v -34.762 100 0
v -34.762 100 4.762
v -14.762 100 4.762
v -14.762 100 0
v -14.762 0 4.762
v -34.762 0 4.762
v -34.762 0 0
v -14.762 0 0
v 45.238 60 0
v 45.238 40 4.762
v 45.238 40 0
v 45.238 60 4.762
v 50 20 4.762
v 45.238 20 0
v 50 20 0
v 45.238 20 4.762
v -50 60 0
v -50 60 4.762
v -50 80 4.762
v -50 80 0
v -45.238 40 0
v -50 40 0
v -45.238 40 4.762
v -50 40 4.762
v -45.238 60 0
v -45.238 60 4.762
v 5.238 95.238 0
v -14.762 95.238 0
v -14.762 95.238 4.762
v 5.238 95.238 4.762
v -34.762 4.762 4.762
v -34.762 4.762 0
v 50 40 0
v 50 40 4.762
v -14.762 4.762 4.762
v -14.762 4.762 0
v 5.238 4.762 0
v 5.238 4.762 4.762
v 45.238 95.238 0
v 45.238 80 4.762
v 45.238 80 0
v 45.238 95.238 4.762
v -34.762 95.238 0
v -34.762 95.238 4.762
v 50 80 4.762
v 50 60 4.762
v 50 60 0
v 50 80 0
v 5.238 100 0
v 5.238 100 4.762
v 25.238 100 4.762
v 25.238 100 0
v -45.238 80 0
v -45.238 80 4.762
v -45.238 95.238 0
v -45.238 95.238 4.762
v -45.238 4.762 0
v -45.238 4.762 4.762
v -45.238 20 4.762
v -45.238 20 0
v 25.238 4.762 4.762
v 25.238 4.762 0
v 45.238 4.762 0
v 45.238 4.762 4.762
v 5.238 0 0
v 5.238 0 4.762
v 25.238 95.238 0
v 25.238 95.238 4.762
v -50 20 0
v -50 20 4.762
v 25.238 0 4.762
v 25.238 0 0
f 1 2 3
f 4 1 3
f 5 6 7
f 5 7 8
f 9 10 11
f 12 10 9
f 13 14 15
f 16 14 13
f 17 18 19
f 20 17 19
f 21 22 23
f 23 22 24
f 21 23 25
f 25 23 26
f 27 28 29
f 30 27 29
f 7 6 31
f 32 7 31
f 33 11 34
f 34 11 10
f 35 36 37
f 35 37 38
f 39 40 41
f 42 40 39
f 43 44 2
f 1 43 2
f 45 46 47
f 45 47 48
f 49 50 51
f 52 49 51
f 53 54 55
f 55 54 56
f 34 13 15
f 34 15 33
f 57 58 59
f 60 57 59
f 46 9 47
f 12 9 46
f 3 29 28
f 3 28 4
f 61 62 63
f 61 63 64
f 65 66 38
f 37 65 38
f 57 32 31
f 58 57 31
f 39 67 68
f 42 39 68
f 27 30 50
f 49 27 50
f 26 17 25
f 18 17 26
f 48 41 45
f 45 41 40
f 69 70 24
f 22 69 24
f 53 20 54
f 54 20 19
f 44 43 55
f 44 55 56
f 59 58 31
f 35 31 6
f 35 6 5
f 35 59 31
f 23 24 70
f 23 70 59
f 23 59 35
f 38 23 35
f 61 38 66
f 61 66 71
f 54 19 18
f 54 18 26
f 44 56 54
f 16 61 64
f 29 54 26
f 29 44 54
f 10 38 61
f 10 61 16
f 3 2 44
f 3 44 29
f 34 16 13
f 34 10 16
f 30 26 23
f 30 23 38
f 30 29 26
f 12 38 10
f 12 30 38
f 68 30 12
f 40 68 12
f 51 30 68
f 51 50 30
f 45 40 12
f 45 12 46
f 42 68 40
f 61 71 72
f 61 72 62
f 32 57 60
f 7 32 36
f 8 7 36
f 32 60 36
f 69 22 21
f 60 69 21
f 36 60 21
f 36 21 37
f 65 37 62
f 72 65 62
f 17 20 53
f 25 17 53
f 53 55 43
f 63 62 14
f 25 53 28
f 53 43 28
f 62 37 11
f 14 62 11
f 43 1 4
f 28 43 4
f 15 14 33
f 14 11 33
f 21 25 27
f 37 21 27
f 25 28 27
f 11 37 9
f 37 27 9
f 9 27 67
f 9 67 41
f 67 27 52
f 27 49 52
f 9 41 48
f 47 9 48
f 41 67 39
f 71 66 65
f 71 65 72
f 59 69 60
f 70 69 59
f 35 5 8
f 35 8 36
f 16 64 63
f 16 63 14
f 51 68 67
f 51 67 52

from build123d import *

# Parameters (mm, degrees)
SKETCH2_W           = 100
SKETCH2_H           = 100
BOSS_EXTRUDE1_DEPTH = 4.7625
CAVITY1_START       = -50
CAVITY1_OUTLINE_W   = 20
CAVITY1_OUTLINE_H   = 4.7625
CAVITY1_DEPTH       = 4.7625
CAVITY1_START_2     = 45.2375
CAVITY1_2_OUTLINE_W = 20
CAVITY1_2_OUTLINE_H = 4.7625
CAVITY1_2_DEPTH     = 4.7625
CAVITY1_START_3     = -14.7625
CAVITY1_3_OUTLINE_W = 4.7625
CAVITY1_3_OUTLINE_H = 4.7625
CAVITY1_3_DEPTH     = 20
CAVITY1_START_4     = 25.2375
CAVITY1_4_OUTLINE_W = 4.7625
CAVITY1_4_OUTLINE_H = 4.7625
CAVITY1_4_DEPTH     = 20
CAVITY1_START_5     = -45.2375
CAVITY1_5_OUTLINE_W = 4.7625
CAVITY1_5_OUTLINE_H = 4.7625
CAVITY1_5_DEPTH     = 10.475


# Read off the part's stored shape, not the designer's step: Cavity1
with BuildPart() as part:
    # Sketch2 → Boss-Extrude1 (new body)
    with BuildSketch(Plane.XY.offset(4.7625)):
        with Locations((0, 50)):
            Rectangle(SKETCH2_W, SKETCH2_H)
    extrude(amount=-BOSS_EXTRUDE1_DEPTH)

    # Cavity1 outline → Cavity1 (cut)
    with BuildSketch(Plane.YZ.offset(CAVITY1_START)):
        with Locations((10, 2.38125)):
            Rectangle(CAVITY1_OUTLINE_W, CAVITY1_OUTLINE_H)
        with Locations((50, 2.38125)):
            Rectangle(CAVITY1_OUTLINE_W, CAVITY1_OUTLINE_H)
        with Locations((90, 2.38125)):
            Rectangle(CAVITY1_OUTLINE_W, CAVITY1_OUTLINE_H)
    extrude(amount=CAVITY1_DEPTH, mode=Mode.SUBTRACT)

    # Cavity1 2 outline → Cavity1 2 (cut)
    with BuildSketch(Plane.YZ.offset(CAVITY1_START_2)):
        with Locations((10, 2.38125)):
            Rectangle(CAVITY1_2_OUTLINE_W, CAVITY1_2_OUTLINE_H)
        with Locations((50, 2.38125)):
            Rectangle(CAVITY1_2_OUTLINE_W, CAVITY1_2_OUTLINE_H)
        with Locations((90, 2.38125)):
            Rectangle(CAVITY1_2_OUTLINE_W, CAVITY1_2_OUTLINE_H)
    extrude(amount=CAVITY1_2_DEPTH, mode=Mode.SUBTRACT)

    # Cavity1 3 outline → Cavity1 3 (cut)
    with BuildSketch(Plane.YZ.offset(CAVITY1_START_3)):
        with Locations((2.38125, 2.38125)):
            Rectangle(CAVITY1_3_OUTLINE_W, CAVITY1_3_OUTLINE_H)
        with Locations((97.61875, 2.38125)):
            Rectangle(CAVITY1_3_OUTLINE_W, CAVITY1_3_OUTLINE_H)
    extrude(amount=CAVITY1_3_DEPTH, mode=Mode.SUBTRACT)

    # Cavity1 4 outline → Cavity1 4 (cut)
    with BuildSketch(Plane.YZ.offset(CAVITY1_START_4)):
        with Locations((2.38125, 2.38125)):
            Rectangle(CAVITY1_4_OUTLINE_W, CAVITY1_4_OUTLINE_H)
        with Locations((97.61875, 2.38125)):
            Rectangle(CAVITY1_4_OUTLINE_W, CAVITY1_4_OUTLINE_H)
    extrude(amount=CAVITY1_4_DEPTH, mode=Mode.SUBTRACT)

    # Cavity1 5 outline → Cavity1 5 (cut)
    with BuildSketch(Plane.YZ.offset(CAVITY1_START_5)):
        with Locations((2.38125, 2.38125)):
            Rectangle(CAVITY1_5_OUTLINE_W, CAVITY1_5_OUTLINE_H)
        with Locations((97.61875, 2.38125)):
            Rectangle(CAVITY1_5_OUTLINE_W, CAVITY1_5_OUTLINE_H)
    extrude(amount=CAVITY1_5_DEPTH, mode=Mode.SUBTRACT)


solid = part.part
